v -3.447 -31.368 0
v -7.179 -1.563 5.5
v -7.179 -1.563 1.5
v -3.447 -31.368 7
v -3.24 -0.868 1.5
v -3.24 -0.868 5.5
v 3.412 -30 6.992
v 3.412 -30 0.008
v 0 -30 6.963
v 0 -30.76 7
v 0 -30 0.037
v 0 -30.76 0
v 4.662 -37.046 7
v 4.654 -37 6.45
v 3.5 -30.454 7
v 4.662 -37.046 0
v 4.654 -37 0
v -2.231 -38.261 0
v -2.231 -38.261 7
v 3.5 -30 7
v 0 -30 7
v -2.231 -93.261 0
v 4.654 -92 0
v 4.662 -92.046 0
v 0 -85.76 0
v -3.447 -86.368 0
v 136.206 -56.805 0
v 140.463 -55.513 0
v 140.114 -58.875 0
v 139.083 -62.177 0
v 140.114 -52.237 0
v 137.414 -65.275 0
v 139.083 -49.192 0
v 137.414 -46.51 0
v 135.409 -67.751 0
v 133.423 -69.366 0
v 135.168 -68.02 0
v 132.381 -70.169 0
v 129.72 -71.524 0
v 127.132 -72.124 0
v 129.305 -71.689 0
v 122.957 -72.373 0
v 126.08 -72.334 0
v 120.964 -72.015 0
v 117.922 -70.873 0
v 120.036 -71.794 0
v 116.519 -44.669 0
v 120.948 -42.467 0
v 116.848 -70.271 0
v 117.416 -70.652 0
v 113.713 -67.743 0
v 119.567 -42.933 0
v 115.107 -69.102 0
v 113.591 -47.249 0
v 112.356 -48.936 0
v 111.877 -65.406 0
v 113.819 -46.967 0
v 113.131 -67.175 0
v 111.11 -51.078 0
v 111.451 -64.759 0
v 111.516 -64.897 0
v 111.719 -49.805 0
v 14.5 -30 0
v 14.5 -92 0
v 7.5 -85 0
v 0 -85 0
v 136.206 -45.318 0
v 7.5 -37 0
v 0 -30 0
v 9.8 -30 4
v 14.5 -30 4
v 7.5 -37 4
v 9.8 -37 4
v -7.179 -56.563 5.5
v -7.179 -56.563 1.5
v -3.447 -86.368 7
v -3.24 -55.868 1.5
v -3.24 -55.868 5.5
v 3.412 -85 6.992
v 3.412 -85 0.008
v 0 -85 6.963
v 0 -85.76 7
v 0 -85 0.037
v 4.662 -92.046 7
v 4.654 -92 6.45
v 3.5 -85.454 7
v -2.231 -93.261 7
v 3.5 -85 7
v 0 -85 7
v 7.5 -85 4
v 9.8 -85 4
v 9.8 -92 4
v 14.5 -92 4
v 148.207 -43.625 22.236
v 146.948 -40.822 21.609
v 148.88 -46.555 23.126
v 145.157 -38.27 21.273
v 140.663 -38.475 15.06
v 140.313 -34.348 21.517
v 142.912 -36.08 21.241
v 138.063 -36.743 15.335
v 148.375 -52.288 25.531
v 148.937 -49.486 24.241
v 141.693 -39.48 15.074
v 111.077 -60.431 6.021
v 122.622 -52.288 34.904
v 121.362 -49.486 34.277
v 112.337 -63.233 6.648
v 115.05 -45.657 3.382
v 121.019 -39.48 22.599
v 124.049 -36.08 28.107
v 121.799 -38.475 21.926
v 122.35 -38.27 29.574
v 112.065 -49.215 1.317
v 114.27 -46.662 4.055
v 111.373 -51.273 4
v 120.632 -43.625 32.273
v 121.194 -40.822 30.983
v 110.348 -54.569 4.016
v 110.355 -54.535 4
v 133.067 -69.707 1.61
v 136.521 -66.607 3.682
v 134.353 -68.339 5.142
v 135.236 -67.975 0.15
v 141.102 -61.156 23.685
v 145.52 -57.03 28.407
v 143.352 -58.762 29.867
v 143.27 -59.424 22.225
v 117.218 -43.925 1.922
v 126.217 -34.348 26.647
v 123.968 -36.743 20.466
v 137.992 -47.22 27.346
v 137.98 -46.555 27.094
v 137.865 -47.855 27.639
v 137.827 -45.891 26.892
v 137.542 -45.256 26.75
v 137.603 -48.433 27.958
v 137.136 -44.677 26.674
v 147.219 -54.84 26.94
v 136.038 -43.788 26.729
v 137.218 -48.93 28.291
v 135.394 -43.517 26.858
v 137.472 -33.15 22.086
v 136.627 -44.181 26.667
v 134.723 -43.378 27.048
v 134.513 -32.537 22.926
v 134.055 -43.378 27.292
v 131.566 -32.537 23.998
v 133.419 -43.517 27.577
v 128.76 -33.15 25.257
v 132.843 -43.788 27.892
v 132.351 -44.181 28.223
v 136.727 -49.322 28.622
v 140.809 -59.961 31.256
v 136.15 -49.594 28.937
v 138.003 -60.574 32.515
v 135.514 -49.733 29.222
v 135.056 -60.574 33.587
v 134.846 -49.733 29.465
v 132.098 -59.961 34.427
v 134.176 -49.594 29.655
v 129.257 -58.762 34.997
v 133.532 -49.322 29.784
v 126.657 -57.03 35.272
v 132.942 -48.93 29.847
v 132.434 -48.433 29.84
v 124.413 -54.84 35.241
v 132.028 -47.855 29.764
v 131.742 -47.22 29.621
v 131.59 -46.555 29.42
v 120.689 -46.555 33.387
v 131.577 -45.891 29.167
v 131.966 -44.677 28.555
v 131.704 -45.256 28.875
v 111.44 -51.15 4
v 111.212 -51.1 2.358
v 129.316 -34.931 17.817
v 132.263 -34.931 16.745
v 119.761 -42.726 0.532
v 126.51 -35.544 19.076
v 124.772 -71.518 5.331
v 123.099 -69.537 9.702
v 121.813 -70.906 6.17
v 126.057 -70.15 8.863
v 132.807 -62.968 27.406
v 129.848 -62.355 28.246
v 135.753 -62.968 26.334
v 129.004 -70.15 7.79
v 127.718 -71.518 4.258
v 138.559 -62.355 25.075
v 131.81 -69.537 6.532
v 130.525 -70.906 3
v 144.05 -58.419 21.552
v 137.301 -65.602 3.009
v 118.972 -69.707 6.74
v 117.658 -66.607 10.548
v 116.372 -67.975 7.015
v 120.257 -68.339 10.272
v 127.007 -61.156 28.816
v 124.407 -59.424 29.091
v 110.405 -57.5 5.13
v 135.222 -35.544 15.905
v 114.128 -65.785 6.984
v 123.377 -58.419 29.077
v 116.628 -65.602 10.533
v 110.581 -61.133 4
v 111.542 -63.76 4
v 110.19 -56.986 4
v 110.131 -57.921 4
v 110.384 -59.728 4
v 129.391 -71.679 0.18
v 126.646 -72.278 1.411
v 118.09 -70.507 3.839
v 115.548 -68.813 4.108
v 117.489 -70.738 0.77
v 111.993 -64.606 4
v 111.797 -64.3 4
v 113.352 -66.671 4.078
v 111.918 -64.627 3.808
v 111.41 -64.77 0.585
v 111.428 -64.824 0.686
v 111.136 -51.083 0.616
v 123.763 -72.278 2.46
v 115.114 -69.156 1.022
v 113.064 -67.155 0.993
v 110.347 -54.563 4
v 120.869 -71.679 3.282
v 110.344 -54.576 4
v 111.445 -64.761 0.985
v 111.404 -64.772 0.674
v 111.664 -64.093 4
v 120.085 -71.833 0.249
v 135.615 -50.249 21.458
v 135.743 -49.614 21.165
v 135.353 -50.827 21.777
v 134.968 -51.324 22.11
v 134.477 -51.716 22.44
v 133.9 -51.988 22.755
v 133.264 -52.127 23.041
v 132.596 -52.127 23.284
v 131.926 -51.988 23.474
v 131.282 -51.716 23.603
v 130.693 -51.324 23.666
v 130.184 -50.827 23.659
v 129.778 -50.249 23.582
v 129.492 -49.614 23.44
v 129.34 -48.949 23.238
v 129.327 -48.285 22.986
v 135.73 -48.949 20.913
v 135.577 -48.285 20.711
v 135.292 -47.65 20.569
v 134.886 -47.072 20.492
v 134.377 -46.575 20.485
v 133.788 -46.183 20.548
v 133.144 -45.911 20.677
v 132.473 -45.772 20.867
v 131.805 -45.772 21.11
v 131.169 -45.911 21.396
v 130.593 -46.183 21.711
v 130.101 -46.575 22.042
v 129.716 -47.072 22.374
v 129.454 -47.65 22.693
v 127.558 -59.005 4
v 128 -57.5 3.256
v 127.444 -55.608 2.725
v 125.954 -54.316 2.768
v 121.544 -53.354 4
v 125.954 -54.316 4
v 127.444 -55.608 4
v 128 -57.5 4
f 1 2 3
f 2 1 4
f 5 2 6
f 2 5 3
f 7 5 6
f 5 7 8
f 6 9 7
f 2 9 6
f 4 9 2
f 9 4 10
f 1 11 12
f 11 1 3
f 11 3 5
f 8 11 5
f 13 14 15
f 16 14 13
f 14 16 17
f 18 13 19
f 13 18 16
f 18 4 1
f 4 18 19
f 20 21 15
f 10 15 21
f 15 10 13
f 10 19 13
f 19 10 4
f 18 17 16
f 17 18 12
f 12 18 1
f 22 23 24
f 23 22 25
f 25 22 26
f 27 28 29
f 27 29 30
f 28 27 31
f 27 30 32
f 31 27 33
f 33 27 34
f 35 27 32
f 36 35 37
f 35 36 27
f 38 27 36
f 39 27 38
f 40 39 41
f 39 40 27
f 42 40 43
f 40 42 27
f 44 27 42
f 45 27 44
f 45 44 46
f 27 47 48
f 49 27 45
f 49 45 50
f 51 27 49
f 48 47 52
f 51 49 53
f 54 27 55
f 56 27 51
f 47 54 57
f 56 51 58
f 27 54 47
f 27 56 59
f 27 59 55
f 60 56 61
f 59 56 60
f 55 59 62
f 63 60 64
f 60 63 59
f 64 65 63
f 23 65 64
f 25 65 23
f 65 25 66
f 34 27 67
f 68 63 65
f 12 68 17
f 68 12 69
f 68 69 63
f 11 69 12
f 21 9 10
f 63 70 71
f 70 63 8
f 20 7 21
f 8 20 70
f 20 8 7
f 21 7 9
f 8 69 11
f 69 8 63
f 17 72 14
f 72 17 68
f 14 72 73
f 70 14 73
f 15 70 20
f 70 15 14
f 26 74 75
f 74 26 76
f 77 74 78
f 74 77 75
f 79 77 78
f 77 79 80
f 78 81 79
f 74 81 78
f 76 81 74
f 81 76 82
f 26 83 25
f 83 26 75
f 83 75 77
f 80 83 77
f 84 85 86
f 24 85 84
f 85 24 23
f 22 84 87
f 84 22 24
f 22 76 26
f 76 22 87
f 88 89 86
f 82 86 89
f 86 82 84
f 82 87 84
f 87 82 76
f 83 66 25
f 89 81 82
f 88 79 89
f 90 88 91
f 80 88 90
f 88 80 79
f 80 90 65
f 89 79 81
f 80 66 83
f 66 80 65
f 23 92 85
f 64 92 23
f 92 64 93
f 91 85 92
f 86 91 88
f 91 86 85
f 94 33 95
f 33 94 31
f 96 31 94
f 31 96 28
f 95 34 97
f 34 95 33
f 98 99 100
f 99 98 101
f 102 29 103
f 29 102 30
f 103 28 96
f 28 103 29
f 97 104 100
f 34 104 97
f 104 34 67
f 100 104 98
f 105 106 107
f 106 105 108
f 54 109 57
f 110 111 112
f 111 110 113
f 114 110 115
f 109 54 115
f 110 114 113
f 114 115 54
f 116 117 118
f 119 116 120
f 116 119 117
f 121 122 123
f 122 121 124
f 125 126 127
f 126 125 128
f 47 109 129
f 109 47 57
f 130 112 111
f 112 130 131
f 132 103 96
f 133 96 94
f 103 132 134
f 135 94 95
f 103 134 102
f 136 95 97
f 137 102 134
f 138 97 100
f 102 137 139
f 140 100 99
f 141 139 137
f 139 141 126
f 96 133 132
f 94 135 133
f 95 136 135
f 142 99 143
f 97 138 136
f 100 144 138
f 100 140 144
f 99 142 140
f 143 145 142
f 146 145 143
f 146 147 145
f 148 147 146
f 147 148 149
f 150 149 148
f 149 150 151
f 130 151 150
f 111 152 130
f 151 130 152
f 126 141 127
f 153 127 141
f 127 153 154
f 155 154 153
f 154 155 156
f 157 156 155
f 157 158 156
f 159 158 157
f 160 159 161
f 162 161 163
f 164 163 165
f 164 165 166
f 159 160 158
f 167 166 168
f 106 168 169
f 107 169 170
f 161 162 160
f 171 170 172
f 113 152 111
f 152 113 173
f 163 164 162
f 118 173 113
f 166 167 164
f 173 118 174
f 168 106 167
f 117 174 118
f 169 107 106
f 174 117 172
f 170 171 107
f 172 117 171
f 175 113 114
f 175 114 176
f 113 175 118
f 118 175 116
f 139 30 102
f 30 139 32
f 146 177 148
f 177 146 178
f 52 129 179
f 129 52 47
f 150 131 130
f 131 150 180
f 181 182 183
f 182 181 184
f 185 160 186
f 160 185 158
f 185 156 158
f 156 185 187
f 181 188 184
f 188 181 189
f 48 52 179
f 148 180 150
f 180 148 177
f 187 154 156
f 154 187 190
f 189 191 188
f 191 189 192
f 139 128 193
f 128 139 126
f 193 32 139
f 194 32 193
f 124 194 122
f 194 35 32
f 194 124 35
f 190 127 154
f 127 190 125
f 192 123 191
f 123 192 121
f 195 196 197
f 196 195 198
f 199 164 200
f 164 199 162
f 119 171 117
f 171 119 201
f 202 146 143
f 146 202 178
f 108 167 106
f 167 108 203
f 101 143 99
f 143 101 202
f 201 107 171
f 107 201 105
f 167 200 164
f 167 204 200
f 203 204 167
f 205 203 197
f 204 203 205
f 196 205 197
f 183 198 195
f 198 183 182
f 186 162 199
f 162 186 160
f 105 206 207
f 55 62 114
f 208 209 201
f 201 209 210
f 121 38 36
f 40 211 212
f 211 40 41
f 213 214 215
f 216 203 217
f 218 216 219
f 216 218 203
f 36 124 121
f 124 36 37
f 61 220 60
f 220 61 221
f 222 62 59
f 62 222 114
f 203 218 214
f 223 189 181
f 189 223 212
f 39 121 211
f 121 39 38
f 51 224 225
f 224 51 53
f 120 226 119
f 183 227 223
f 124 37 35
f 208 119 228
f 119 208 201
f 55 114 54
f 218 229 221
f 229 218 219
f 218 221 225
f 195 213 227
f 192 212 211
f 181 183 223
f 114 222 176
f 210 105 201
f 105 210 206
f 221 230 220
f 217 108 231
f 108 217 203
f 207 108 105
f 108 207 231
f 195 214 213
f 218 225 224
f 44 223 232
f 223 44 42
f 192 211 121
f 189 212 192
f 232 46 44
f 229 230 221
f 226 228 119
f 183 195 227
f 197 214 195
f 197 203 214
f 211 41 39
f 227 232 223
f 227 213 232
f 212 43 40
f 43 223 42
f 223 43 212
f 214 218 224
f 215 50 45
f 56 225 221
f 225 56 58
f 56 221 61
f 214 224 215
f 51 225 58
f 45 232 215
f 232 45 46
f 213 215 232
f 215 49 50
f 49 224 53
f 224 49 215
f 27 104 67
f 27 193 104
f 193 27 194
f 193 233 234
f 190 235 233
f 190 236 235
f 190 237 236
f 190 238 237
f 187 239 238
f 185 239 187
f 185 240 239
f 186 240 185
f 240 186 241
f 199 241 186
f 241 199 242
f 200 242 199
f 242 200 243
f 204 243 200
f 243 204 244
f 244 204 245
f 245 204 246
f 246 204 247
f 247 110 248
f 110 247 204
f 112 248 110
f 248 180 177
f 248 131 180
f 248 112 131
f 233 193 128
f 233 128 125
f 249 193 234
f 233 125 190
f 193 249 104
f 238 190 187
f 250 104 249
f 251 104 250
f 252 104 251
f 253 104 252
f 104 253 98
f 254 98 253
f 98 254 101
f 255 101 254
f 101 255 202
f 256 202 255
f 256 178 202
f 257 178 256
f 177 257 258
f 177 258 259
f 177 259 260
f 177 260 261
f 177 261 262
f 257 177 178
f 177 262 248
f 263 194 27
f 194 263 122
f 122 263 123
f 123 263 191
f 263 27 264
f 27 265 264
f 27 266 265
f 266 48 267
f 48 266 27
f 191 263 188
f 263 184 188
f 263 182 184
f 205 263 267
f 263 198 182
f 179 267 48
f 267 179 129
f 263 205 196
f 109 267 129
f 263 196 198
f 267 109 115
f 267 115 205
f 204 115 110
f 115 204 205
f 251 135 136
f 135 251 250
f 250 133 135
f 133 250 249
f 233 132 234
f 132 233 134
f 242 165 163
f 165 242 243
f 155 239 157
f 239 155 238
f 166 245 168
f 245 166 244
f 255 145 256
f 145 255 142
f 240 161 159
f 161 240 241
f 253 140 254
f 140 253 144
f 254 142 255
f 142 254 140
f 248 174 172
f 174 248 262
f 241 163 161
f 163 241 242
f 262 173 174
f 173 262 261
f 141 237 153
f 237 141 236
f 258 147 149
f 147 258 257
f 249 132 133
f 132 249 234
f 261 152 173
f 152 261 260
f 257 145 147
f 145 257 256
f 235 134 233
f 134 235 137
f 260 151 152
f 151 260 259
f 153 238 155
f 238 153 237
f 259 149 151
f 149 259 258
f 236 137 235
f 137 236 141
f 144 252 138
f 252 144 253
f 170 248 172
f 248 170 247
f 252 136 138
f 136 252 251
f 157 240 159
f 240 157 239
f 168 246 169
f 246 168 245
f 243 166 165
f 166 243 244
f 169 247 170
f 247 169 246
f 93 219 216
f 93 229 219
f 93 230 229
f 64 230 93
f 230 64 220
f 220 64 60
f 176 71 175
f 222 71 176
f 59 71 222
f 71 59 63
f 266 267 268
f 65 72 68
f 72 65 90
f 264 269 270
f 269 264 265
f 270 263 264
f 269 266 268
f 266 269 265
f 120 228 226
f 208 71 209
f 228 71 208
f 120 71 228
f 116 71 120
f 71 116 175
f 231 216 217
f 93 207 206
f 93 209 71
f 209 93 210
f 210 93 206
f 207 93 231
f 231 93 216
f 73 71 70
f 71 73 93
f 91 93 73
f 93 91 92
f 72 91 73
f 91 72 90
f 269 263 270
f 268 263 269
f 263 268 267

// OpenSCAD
// Use partname to control which object is being rendered:
//
// _partname_values wall_mounted_clasp wall_plate mount_for_3m_adhesive_cover shelf_mounted_clasp
partname = "wall_mounted_clasp";

// generic thickness of walls, as used here and there:
wall_thickness = 2;
// a special wall; the piece that extends from the quickmount to the business end:
wall_mount_offset_thickness = 4;

// a special wall; the width between the camera screw and the base station
// (set this depending on how long your screw is)
screw_wall_thickness = 5;

// a special wall; the edges of the "cover" inserts for the 3m hook gaps in wall_plate().
mount_for_3m_adhesive_cover_thickness = 1;

base_station_grabber_strip_width = 10;

wall_mount_wh = [90,90];
wall_mount_thickness = 11;
// minimum offset from wall to reach beyond obstacles (blackout curtains):
wall_mount_offset_length = 90;
// not a rectangular room? lower than 90 opens the mount further:
wall_mount_offset_angle = 90-20;
// down angle from pointing straight outwards; should be mounted above eye level and pointed downwards:
wall_mount_base_station_off_mount_rotation = [-20,0,-20];

shelf_beam_cutout_wd = [16.3,16.3];
// how much of a beam to grab onto:
shelf_beam_grab_length = 60;
shelf_beam_lip_size = 1.5;
shelf_screwmount_height = 35;
shelf_screwmount_rotation = [-90-20,0,20];
shelf_screw_clearance_height = 20;




// height over feet to extend the base rim (i.e. how deep the cutout the base
// stands in is):
//
// On choosing this: the non-stick bottom coating is roughly 2mm tall, so one
// wants to get clear of that.
base_station_rim_height = 4;

/*
 * physically conditioned constants
 */

base_rear_width = 69;
base_rear_height = 77;
base_front_width = 75;
base_front_height = 79;
// from front of circular part to flat back, same at front and back (phew)
base_depth = 63;
// from where circular part begins to flat back; not length of side
base_depth_noncircular = 45;
// can't say this was directly measured, but close enough:
base_circle_radius = 48;

// from bottom to center of plug:
base_power_inlet_height = 28.5;
// from left side (as seen from the back) to center of plug:
base_power_inlet_inset = 18;
// the radius to clear for the plug:
base_power_inlet_clearance_radius = 4.5;
// from the flat back to the height of the clearance cylinder:
base_power_inlet_clearance_height = 4;


// screwthrad is centered; how high from base of bottom?
base_screwthread_height = 52;
screwthread_radius = 3.4;
screw_head_radius = 10+1; // real radius is 20mm, give or take
wall_mount_screw_clearance_height = 21;

wall_mount_screwmount_height = 30;

/*
 * arbitrary internal assignments
 */

mount_for_3m_adhesive_wdh = [25,3,62];
base_station_top_angle = atan((base_front_height-base_rear_height)/base_depth);

pyramid_slot_height=30;
// first is bottom square side length, second is top square side length:
pyramid_slot_sidelengths=[4,7];
pyramid_slot_height_difference = 55;
pyramid_slot_excavation_sidelength = pyramid_slot_sidelengths[1]+2*0.5;
pyramid_entry_angle = 10;

// relative to the wall_mount_thickness and wall_mount_offset_length, how far
// before the clasp is clear of wall_mount()?
wall_mount_clearance_before_clasp_solids = wall_mount_thickness;



wall_mount_pyramid_positions = [
  [
    wall_mount_wh[0]-wall_mount_thickness,
    wall_thickness+pyramid_slot_sidelengths[1]/2,
    wall_mount_wh[1]-pyramid_slot_height-pyramid_slot_height_difference
  ],
  [
    wall_mount_wh[0]-wall_mount_thickness,
    wall_thickness+pyramid_slot_sidelengths[1]/2,
    wall_mount_wh[1]-pyramid_slot_height
  ]
];

wall_mount_pyramid_rotation = [
      0,
      pyramid_entry_angle,
      wall_mount_offset_angle];

/*
 * modules
 */


// hold this one against the xz plane:
module camera_screw_thread_mount(rotation,screwmount_height,screw_clearance_height)
{
  intersection()
  {
    // cut to only stuff y-positive of the the xz plane:
    translate([-200/2,0,-200/2])
      cube([200,200,200]);
    rotate(rotation)
    {
      difference()
      {
        // a cylindrical extension towards the screwthread
        union()
        {
          cylinder(
            r=screw_head_radius+2*wall_thickness,
            h=screwmount_height+wall_thickness
          );
          sphere(r=screw_head_radius+2*wall_thickness);
        }
        translate([
          -screw_head_radius,
          -2*screw_head_radius,
          screwmount_height-screw_wall_thickness-screw_clearance_height
        ]) {
          cube([2*screw_head_radius,4*screw_head_radius,screw_clearance_height]);
        }
        translate([0,0,(screwmount_height-screw_clearance_height)])
        cylinder(r=screwthread_radius,h=2*screw_clearance_height,$fs=0.3);
      }
    }
  }
}

module mount_for_3m_adhesive_pos ()
{
  render()
  {
    intersection()
    {
      cube(mount_for_3m_adhesive_wdh);
      translate([12.5,0,16.8])
        mirror([0,0,1])
        import("imports/Index_Wall_Bracket.stl");
    }
  }
}
module mount_for_3m_adhesive_neg ()
{
  render()
  {
    difference()
    {
      translate([0.01,0.01,0.01])
        cube(mount_for_3m_adhesive_wdh-[0.02,0.02,0.02]);
      mount_for_3m_adhesive_pos();
    }
  }
}
module base_station_bottom_2d_profile()
{
  polygon([
    [-base_rear_width/2, 0],
    [base_rear_width/2, 0],
    [base_front_width/2, base_depth_noncircular],
    [-base_front_width/2, base_depth_noncircular],
  ]);
  intersection()
  {
    translate([-base_front_width/2,base_depth_noncircular])
      square([base_front_width,base_depth-base_depth_noncircular]);
    translate([0,base_depth-base_circle_radius,0])
      circle(r=base_circle_radius);
  }
}
module base_station()
{
  % color([0.4,0.4,0.4,0.7])
  {
    translate([-base_rear_width/2,0,0])
    {
      // at this point, at bottom left of back of case, where the measurements apply:
      translate([base_power_inlet_inset,0,base_power_inlet_height])
      {
        // the plug cylinder clearance itself:
        rotate([90,0,0])
          cylinder(r=base_power_inlet_clearance_radius,h=base_power_inlet_clearance_height);

        // the plug itself:
        translate([0,-base_power_inlet_clearance_height-base_power_inlet_clearance_radius,0])
        {
          translate([0,0,-20])
            cylinder(r=base_power_inlet_clearance_radius,h=20+base_power_inlet_clearance_radius);
        }

      }
    }
  }
  % color([0,0,0,0.7])
  {
    difference()
    {
      linear_extrude(height = base_front_height)
      {
        base_station_bottom_2d_profile();
      }
      translate([-base_front_width/2,0,base_rear_height])
        rotate([base_station_top_angle,0,0])
          cube([base_front_width,base_depth,base_front_height]);
    }
  }
  % color([0.9,0.9,0.9,0.7])
  {
    translate([0,0,base_screwthread_height])
      rotate([90,0,0])
        cylinder(r=screwthread_radius,h=10);
  }
}
module clasp_for_base_station ()
{
  scale_factor = (2*wall_thickness+base_front_width)/base_front_width;
  // floorplate, with cutout for base station to stand in:
  difference()
  {
    linear_extrude(height = wall_thickness+base_station_rim_height)
    {
      scale(scale_factor)
        base_station_bottom_2d_profile();
    }
    translate([0,0,wall_thickness])
    {
      linear_extrude(height = (wall_thickness+base_station_rim_height)+/*get off:*/wall_thickness)
      {
        scale(0.97*scale_factor)
          base_station_bottom_2d_profile();
      }
    }
  }
  // back wall (FIXME: could be triangular-esque?)
  difference()
  {
    translate([0,0,wall_thickness])
    {
      linear_extrude(height = base_rear_height + wall_thickness)
      {
        scale([scale_factor,1,1])
          translate([-base_rear_width/2,0])
            square([base_rear_width,wall_thickness]);
      }
    }
    translate([-base_rear_width/2,2*wall_thickness,0])
    {
      // at this point, at bottom left of back of case, where the measurements apply:
      translate([base_power_inlet_inset,0,base_power_inlet_height])
        rotate([90,0,0])
          cylinder(r=base_power_inlet_clearance_radius,h=3*wall_thickness);
    }

  }
  // grabber for front of base station:
  grabber_length = wall_thickness + base_depth/cos(base_station_top_angle);
  translate([0,0,wall_thickness + base_rear_height])
    translate([0,wall_thickness,0])
      rotate([base_station_top_angle,0,0])
      {
        translate([-base_station_grabber_strip_width/2,0,0])
          cube([base_station_grabber_strip_width,grabber_length,wall_thickness]);
        // reinforcement rib:
        translate([-wall_thickness/2,0,0])
          cube([wall_thickness,grabber_length,2*wall_thickness]);
        // now, "go there", to the end of the grabber, and place some downward wall:
        translate([0,grabber_length-wall_thickness,-2*wall_thickness])
          translate([-base_station_grabber_strip_width/2,0,0])
            cube([base_station_grabber_strip_width,wall_thickness,2*wall_thickness]);
      }
}

module pyramid_slot()
{

  linear_extrude(
    height = pyramid_slot_height,
    scale=(pyramid_slot_sidelengths[1]/pyramid_slot_sidelengths[0]))
  {
    translate([-pyramid_slot_sidelengths[0]/2,-pyramid_slot_sidelengths[0]/2])
      square([pyramid_slot_sidelengths[0],pyramid_slot_sidelengths[0]]);
  }
}

module pyramid_slot_excavation()
{
  pyramid_slot();

  translate([
    -pyramid_slot_excavation_sidelength/2,
    -pyramid_slot_excavation_sidelength/2,
    pyramid_slot_height-0.01]
  ){
    // the idea is to provide a slide-in track of pyramid_slot_height length,
    // but to ensure that cuts loose, double it:
      cube([pyramid_slot_height,pyramid_slot_excavation_sidelength,2*pyramid_slot_height]);
  }
}

// To mount semi-permanently to wall:
module wall_plate()
{
  module rounded_plate(width, height, radius)
  {
    intersection()
    {
      translate([radius,0,radius])
      {
        minkowski()
        {
          sphere(r=radius);
          cube([
            width-2*radius,
            0.01,
            height-2*radius]);
        }
      }
      cube([width,radius,height]);
    }
  }
  mount_for_3m_adhesive_xoffs = [
    2*wall_mount_wh[0]/9-mount_for_3m_adhesive_wdh[0]/2,
    6*wall_mount_wh[0]/9-mount_for_3m_adhesive_wdh[0]/2
  ];
  mount_for_3m_adhesive_height =
    wall_mount_wh[1]-1*wall_mount_thickness-mount_for_3m_adhesive_wdh[2];


  // base plate sans:
  difference()
  {
    union()
    {
      rounded_plate(wall_mount_wh[0],wall_mount_wh[1],wall_mount_thickness);
    }
    // * cutouts to place 3m adhesive attachments into:
    for (xoff=mount_for_3m_adhesive_xoffs)
    {
      translate([xoff, -0.01, mount_for_3m_adhesive_height])
        cube(mount_for_3m_adhesive_wdh+[0,wall_mount_thickness,0]);
    }
    // * quick-attach pyramid slot
    for (wall_mount_pyramid_position=wall_mount_pyramid_positions)
      translate(wall_mount_pyramid_position)
        rotate(wall_mount_pyramid_rotation)
          pyramid_slot_excavation();
  }

  for (xoff=mount_for_3m_adhesive_xoffs)
  {
    translate([xoff, -0.01, mount_for_3m_adhesive_height])
      mount_for_3m_adhesive_pos();
  }
}

// Using clasp_for_base_station() to fit with wall_plate():
// centers on (and rotates according to) the bottom of its pyramid_slot():
module wall_mounted_clasp()
{
  // the pyramid_slot hooks themselves:

  for (zoff=[0,pyramid_slot_height_difference])
  {
    translate([0,pyramid_slot_sidelengths[1]/2,zoff])
    {
      translate([
        -sin(pyramid_entry_angle)*pyramid_slot_height,
        0,
        sin(pyramid_entry_angle)*pyramid_slot_sidelengths[1]
      ]){
        rotate([0,pyramid_entry_angle,0])
        {
          pyramid_slot();
          translate([-pyramid_slot_sidelengths[1]/2,-pyramid_slot_sidelengths[1]/2,pyramid_slot_height])
          {
            cube([pyramid_slot_sidelengths[1],pyramid_slot_sidelengths[1],pyramid_slot_sidelengths[1]]);
          }
        }
      }
      translate([
        -pyramid_slot_sidelengths[1]/2,
        -pyramid_slot_sidelengths[1]/2,
        pyramid_slot_height]
      ){
        linear_extrude(height = pyramid_slot_sidelengths[1])
        {
          polygon([
            [pyramid_slot_sidelengths[1]/2,0],
            [pyramid_slot_sidelengths[1]/2,pyramid_slot_sidelengths[1]],
            [pyramid_slot_sidelengths[1],pyramid_slot_sidelengths[1]],
            [2.5*pyramid_slot_sidelengths[1],wall_thickness],
            [2.5*pyramid_slot_sidelengths[1],0],
          ]);
        }
      }
    }
  }
  // the span between the outriggers created by the hooks:
  hull()
  {
    for (zoff=[0,pyramid_slot_height_difference])
    {
      translate([wall_mount_clearance_before_clasp_solids,0,zoff])
      {
        translate([
          -pyramid_slot_sidelengths[1]/2,
          0,
          pyramid_slot_height]
        ){
          cube([
            pyramid_slot_sidelengths[1],
            wall_mount_offset_thickness,
            pyramid_slot_sidelengths[1]]
          );
        }
      }
    }
    // mount for where the business end of the mount goes
    translate([
      wall_mount_offset_length+base_rear_width/2,
      0,
      pyramid_slot_height+(pyramid_slot_height_difference/2)
    ]){
      rotate([-90,0,0])
        cylinder(r=pyramid_slot_sidelengths[1]/2,h=wall_mount_offset_thickness);

    }
  }
  translate([
    wall_mount_offset_length+base_rear_width/2,
    0,
    pyramid_slot_height+(pyramid_slot_height_difference/2)
  ]) {
    camera_screw_thread_mount(
      wall_mount_base_station_off_mount_rotation-[90,0,0],
      wall_mount_screwmount_height,
      wall_mount_screw_clearance_height
    );
  }


  // base station mounting:
  translate([
    wall_mount_offset_length+base_rear_width/2,
    0,
    0,
  ]){
    rotate(wall_mount_base_station_off_mount_rotation)
      base_station();
  }
}

module shelf_mount()
{
  difference()
  {
    cube([
      shelf_beam_grab_length,
      shelf_beam_cutout_wd[1]+2*wall_thickness,
      shelf_beam_grab_length]);

    translate([
      -shelf_beam_grab_length,
      -0.01,
      shelf_beam_grab_length-(shelf_beam_cutout_wd[0]+wall_thickness)
    ]){
      // The horizontal beam cutout:
      cube([
      3*shelf_beam_grab_length, // cut through it all
      shelf_beam_cutout_wd[1]+wall_thickness,
      shelf_beam_cutout_wd[0]]);
    }

    translate([
      shelf_beam_grab_length-shelf_beam_cutout_wd[0]-wall_thickness,
      wall_thickness,
      -0.01
    ]) {
      // The vertical beam cutout
      cube([shelf_beam_cutout_wd[0],shelf_beam_cutout_wd[1],shelf_beam_grab_length-wall_thickness]);
      // The vertical beam cutout's cutting free (but with clip-on lips)
      translate([shelf_beam_lip_size,-2*wall_thickness,0])
      {
        cube([
          shelf_beam_cutout_wd[0]-2*shelf_beam_lip_size,
          3*wall_thickness,
          shelf_beam_grab_length-wall_thickness
        ]);
      }
    }
  }
}

module shelf_mount_thread_mount()
{
  translate([
    (shelf_beam_grab_length-shelf_beam_cutout_wd[0])/2,
    0,
    (shelf_beam_grab_length-shelf_beam_cutout_wd[1])/2
  ]) {
    mirror([0,1,0])
    {
      camera_screw_thread_mount(
      shelf_screwmount_rotation,
      shelf_screwmount_height,
      shelf_screw_clearance_height
      );
    }
  }
}
module shelf_mounted_clasp()
{
  shelf_mount();
  shelf_mount_thread_mount();
}

module mount_for_3m_adhesive_cover()
{
  // by how much this cover (which slots into a gap) should be undersized
  // from said gap:
  shrink_amount = 0.3;

  outer_wdh = [
    mount_for_3m_adhesive_wdh[0]-shrink_amount,
    wall_mount_thickness-mount_for_3m_adhesive_wdh[1]-wall_thickness,
    mount_for_3m_adhesive_wdh[2]-shrink_amount
  ];



  difference()
  {
    cube(outer_wdh);
    translate([
      mount_for_3m_adhesive_cover_thickness,
      -mount_for_3m_adhesive_cover_thickness,
      mount_for_3m_adhesive_cover_thickness
    ]) {
      cube([
        outer_wdh[0]-2*mount_for_3m_adhesive_cover_thickness,
        outer_wdh[1],
        outer_wdh[2]-2*mount_for_3m_adhesive_cover_thickness
      ]);
    }
  }
}
// $fa is the minimum angle for a fragment. Minimum value is 0.01.
$fa = 12;
// $fs is the minimum size of a fragment. If high, causes
// fewer-than-$fa-would-indicate surfaces. Minimum is 0.01.
$fs = 2;


// Conventions:
// * When an object is rendered using partname, position/rotate it according to
//   printing suggestion, here. (The module itself will be positioned/rotated
//   like it will be, in the put-together "display" situation.)
// * The special value "display" for partname is the product picture for all
//   parts put together.
if ("display" == partname)
{

  // Note: offsets in the composition of partname=display are hardwired and may
  // not follow (changes to) parameter values neatly.
  //
  // The submodules are often self-relatively specified, and with no need to
  // fit into the grander scheme of things. Thus, these are mere "looks about
  // right" settings, for the look of things.

  translate([0,wall_mount_wh[0],0])
    rotate([0,0,-90])
      wall_plate();
  translate([20,0,20])
    rotate([0,0,wall_mount_offset_angle-90])
      wall_mounted_clasp();

  for (xoff = [42,82])
    translate([20,xoff,20])
      rotate([0,0,-90])
        mount_for_3m_adhesive_cover();

  translate([0,200,0])
    rotate([0,0,90])
    shelf_mounted_clasp ();


} else if ("wall_mounted_clasp" == partname)
{
  rotate([90,0,0])
  {
    wall_mounted_clasp();
  }
} else if ("wall_plate" == partname)
{
  rotate([90,0,0])
  {
    wall_plate();
  }
} else if ("mount_for_3m_adhesive_cover" == partname)
{
  rotate([90,0,0])
  {
    mount_for_3m_adhesive_cover();
  }
} else if ("shelf_mounted_clasp" == partname)
{
  rotate([-90,0,00])
    shelf_mounted_clasp ();
}
